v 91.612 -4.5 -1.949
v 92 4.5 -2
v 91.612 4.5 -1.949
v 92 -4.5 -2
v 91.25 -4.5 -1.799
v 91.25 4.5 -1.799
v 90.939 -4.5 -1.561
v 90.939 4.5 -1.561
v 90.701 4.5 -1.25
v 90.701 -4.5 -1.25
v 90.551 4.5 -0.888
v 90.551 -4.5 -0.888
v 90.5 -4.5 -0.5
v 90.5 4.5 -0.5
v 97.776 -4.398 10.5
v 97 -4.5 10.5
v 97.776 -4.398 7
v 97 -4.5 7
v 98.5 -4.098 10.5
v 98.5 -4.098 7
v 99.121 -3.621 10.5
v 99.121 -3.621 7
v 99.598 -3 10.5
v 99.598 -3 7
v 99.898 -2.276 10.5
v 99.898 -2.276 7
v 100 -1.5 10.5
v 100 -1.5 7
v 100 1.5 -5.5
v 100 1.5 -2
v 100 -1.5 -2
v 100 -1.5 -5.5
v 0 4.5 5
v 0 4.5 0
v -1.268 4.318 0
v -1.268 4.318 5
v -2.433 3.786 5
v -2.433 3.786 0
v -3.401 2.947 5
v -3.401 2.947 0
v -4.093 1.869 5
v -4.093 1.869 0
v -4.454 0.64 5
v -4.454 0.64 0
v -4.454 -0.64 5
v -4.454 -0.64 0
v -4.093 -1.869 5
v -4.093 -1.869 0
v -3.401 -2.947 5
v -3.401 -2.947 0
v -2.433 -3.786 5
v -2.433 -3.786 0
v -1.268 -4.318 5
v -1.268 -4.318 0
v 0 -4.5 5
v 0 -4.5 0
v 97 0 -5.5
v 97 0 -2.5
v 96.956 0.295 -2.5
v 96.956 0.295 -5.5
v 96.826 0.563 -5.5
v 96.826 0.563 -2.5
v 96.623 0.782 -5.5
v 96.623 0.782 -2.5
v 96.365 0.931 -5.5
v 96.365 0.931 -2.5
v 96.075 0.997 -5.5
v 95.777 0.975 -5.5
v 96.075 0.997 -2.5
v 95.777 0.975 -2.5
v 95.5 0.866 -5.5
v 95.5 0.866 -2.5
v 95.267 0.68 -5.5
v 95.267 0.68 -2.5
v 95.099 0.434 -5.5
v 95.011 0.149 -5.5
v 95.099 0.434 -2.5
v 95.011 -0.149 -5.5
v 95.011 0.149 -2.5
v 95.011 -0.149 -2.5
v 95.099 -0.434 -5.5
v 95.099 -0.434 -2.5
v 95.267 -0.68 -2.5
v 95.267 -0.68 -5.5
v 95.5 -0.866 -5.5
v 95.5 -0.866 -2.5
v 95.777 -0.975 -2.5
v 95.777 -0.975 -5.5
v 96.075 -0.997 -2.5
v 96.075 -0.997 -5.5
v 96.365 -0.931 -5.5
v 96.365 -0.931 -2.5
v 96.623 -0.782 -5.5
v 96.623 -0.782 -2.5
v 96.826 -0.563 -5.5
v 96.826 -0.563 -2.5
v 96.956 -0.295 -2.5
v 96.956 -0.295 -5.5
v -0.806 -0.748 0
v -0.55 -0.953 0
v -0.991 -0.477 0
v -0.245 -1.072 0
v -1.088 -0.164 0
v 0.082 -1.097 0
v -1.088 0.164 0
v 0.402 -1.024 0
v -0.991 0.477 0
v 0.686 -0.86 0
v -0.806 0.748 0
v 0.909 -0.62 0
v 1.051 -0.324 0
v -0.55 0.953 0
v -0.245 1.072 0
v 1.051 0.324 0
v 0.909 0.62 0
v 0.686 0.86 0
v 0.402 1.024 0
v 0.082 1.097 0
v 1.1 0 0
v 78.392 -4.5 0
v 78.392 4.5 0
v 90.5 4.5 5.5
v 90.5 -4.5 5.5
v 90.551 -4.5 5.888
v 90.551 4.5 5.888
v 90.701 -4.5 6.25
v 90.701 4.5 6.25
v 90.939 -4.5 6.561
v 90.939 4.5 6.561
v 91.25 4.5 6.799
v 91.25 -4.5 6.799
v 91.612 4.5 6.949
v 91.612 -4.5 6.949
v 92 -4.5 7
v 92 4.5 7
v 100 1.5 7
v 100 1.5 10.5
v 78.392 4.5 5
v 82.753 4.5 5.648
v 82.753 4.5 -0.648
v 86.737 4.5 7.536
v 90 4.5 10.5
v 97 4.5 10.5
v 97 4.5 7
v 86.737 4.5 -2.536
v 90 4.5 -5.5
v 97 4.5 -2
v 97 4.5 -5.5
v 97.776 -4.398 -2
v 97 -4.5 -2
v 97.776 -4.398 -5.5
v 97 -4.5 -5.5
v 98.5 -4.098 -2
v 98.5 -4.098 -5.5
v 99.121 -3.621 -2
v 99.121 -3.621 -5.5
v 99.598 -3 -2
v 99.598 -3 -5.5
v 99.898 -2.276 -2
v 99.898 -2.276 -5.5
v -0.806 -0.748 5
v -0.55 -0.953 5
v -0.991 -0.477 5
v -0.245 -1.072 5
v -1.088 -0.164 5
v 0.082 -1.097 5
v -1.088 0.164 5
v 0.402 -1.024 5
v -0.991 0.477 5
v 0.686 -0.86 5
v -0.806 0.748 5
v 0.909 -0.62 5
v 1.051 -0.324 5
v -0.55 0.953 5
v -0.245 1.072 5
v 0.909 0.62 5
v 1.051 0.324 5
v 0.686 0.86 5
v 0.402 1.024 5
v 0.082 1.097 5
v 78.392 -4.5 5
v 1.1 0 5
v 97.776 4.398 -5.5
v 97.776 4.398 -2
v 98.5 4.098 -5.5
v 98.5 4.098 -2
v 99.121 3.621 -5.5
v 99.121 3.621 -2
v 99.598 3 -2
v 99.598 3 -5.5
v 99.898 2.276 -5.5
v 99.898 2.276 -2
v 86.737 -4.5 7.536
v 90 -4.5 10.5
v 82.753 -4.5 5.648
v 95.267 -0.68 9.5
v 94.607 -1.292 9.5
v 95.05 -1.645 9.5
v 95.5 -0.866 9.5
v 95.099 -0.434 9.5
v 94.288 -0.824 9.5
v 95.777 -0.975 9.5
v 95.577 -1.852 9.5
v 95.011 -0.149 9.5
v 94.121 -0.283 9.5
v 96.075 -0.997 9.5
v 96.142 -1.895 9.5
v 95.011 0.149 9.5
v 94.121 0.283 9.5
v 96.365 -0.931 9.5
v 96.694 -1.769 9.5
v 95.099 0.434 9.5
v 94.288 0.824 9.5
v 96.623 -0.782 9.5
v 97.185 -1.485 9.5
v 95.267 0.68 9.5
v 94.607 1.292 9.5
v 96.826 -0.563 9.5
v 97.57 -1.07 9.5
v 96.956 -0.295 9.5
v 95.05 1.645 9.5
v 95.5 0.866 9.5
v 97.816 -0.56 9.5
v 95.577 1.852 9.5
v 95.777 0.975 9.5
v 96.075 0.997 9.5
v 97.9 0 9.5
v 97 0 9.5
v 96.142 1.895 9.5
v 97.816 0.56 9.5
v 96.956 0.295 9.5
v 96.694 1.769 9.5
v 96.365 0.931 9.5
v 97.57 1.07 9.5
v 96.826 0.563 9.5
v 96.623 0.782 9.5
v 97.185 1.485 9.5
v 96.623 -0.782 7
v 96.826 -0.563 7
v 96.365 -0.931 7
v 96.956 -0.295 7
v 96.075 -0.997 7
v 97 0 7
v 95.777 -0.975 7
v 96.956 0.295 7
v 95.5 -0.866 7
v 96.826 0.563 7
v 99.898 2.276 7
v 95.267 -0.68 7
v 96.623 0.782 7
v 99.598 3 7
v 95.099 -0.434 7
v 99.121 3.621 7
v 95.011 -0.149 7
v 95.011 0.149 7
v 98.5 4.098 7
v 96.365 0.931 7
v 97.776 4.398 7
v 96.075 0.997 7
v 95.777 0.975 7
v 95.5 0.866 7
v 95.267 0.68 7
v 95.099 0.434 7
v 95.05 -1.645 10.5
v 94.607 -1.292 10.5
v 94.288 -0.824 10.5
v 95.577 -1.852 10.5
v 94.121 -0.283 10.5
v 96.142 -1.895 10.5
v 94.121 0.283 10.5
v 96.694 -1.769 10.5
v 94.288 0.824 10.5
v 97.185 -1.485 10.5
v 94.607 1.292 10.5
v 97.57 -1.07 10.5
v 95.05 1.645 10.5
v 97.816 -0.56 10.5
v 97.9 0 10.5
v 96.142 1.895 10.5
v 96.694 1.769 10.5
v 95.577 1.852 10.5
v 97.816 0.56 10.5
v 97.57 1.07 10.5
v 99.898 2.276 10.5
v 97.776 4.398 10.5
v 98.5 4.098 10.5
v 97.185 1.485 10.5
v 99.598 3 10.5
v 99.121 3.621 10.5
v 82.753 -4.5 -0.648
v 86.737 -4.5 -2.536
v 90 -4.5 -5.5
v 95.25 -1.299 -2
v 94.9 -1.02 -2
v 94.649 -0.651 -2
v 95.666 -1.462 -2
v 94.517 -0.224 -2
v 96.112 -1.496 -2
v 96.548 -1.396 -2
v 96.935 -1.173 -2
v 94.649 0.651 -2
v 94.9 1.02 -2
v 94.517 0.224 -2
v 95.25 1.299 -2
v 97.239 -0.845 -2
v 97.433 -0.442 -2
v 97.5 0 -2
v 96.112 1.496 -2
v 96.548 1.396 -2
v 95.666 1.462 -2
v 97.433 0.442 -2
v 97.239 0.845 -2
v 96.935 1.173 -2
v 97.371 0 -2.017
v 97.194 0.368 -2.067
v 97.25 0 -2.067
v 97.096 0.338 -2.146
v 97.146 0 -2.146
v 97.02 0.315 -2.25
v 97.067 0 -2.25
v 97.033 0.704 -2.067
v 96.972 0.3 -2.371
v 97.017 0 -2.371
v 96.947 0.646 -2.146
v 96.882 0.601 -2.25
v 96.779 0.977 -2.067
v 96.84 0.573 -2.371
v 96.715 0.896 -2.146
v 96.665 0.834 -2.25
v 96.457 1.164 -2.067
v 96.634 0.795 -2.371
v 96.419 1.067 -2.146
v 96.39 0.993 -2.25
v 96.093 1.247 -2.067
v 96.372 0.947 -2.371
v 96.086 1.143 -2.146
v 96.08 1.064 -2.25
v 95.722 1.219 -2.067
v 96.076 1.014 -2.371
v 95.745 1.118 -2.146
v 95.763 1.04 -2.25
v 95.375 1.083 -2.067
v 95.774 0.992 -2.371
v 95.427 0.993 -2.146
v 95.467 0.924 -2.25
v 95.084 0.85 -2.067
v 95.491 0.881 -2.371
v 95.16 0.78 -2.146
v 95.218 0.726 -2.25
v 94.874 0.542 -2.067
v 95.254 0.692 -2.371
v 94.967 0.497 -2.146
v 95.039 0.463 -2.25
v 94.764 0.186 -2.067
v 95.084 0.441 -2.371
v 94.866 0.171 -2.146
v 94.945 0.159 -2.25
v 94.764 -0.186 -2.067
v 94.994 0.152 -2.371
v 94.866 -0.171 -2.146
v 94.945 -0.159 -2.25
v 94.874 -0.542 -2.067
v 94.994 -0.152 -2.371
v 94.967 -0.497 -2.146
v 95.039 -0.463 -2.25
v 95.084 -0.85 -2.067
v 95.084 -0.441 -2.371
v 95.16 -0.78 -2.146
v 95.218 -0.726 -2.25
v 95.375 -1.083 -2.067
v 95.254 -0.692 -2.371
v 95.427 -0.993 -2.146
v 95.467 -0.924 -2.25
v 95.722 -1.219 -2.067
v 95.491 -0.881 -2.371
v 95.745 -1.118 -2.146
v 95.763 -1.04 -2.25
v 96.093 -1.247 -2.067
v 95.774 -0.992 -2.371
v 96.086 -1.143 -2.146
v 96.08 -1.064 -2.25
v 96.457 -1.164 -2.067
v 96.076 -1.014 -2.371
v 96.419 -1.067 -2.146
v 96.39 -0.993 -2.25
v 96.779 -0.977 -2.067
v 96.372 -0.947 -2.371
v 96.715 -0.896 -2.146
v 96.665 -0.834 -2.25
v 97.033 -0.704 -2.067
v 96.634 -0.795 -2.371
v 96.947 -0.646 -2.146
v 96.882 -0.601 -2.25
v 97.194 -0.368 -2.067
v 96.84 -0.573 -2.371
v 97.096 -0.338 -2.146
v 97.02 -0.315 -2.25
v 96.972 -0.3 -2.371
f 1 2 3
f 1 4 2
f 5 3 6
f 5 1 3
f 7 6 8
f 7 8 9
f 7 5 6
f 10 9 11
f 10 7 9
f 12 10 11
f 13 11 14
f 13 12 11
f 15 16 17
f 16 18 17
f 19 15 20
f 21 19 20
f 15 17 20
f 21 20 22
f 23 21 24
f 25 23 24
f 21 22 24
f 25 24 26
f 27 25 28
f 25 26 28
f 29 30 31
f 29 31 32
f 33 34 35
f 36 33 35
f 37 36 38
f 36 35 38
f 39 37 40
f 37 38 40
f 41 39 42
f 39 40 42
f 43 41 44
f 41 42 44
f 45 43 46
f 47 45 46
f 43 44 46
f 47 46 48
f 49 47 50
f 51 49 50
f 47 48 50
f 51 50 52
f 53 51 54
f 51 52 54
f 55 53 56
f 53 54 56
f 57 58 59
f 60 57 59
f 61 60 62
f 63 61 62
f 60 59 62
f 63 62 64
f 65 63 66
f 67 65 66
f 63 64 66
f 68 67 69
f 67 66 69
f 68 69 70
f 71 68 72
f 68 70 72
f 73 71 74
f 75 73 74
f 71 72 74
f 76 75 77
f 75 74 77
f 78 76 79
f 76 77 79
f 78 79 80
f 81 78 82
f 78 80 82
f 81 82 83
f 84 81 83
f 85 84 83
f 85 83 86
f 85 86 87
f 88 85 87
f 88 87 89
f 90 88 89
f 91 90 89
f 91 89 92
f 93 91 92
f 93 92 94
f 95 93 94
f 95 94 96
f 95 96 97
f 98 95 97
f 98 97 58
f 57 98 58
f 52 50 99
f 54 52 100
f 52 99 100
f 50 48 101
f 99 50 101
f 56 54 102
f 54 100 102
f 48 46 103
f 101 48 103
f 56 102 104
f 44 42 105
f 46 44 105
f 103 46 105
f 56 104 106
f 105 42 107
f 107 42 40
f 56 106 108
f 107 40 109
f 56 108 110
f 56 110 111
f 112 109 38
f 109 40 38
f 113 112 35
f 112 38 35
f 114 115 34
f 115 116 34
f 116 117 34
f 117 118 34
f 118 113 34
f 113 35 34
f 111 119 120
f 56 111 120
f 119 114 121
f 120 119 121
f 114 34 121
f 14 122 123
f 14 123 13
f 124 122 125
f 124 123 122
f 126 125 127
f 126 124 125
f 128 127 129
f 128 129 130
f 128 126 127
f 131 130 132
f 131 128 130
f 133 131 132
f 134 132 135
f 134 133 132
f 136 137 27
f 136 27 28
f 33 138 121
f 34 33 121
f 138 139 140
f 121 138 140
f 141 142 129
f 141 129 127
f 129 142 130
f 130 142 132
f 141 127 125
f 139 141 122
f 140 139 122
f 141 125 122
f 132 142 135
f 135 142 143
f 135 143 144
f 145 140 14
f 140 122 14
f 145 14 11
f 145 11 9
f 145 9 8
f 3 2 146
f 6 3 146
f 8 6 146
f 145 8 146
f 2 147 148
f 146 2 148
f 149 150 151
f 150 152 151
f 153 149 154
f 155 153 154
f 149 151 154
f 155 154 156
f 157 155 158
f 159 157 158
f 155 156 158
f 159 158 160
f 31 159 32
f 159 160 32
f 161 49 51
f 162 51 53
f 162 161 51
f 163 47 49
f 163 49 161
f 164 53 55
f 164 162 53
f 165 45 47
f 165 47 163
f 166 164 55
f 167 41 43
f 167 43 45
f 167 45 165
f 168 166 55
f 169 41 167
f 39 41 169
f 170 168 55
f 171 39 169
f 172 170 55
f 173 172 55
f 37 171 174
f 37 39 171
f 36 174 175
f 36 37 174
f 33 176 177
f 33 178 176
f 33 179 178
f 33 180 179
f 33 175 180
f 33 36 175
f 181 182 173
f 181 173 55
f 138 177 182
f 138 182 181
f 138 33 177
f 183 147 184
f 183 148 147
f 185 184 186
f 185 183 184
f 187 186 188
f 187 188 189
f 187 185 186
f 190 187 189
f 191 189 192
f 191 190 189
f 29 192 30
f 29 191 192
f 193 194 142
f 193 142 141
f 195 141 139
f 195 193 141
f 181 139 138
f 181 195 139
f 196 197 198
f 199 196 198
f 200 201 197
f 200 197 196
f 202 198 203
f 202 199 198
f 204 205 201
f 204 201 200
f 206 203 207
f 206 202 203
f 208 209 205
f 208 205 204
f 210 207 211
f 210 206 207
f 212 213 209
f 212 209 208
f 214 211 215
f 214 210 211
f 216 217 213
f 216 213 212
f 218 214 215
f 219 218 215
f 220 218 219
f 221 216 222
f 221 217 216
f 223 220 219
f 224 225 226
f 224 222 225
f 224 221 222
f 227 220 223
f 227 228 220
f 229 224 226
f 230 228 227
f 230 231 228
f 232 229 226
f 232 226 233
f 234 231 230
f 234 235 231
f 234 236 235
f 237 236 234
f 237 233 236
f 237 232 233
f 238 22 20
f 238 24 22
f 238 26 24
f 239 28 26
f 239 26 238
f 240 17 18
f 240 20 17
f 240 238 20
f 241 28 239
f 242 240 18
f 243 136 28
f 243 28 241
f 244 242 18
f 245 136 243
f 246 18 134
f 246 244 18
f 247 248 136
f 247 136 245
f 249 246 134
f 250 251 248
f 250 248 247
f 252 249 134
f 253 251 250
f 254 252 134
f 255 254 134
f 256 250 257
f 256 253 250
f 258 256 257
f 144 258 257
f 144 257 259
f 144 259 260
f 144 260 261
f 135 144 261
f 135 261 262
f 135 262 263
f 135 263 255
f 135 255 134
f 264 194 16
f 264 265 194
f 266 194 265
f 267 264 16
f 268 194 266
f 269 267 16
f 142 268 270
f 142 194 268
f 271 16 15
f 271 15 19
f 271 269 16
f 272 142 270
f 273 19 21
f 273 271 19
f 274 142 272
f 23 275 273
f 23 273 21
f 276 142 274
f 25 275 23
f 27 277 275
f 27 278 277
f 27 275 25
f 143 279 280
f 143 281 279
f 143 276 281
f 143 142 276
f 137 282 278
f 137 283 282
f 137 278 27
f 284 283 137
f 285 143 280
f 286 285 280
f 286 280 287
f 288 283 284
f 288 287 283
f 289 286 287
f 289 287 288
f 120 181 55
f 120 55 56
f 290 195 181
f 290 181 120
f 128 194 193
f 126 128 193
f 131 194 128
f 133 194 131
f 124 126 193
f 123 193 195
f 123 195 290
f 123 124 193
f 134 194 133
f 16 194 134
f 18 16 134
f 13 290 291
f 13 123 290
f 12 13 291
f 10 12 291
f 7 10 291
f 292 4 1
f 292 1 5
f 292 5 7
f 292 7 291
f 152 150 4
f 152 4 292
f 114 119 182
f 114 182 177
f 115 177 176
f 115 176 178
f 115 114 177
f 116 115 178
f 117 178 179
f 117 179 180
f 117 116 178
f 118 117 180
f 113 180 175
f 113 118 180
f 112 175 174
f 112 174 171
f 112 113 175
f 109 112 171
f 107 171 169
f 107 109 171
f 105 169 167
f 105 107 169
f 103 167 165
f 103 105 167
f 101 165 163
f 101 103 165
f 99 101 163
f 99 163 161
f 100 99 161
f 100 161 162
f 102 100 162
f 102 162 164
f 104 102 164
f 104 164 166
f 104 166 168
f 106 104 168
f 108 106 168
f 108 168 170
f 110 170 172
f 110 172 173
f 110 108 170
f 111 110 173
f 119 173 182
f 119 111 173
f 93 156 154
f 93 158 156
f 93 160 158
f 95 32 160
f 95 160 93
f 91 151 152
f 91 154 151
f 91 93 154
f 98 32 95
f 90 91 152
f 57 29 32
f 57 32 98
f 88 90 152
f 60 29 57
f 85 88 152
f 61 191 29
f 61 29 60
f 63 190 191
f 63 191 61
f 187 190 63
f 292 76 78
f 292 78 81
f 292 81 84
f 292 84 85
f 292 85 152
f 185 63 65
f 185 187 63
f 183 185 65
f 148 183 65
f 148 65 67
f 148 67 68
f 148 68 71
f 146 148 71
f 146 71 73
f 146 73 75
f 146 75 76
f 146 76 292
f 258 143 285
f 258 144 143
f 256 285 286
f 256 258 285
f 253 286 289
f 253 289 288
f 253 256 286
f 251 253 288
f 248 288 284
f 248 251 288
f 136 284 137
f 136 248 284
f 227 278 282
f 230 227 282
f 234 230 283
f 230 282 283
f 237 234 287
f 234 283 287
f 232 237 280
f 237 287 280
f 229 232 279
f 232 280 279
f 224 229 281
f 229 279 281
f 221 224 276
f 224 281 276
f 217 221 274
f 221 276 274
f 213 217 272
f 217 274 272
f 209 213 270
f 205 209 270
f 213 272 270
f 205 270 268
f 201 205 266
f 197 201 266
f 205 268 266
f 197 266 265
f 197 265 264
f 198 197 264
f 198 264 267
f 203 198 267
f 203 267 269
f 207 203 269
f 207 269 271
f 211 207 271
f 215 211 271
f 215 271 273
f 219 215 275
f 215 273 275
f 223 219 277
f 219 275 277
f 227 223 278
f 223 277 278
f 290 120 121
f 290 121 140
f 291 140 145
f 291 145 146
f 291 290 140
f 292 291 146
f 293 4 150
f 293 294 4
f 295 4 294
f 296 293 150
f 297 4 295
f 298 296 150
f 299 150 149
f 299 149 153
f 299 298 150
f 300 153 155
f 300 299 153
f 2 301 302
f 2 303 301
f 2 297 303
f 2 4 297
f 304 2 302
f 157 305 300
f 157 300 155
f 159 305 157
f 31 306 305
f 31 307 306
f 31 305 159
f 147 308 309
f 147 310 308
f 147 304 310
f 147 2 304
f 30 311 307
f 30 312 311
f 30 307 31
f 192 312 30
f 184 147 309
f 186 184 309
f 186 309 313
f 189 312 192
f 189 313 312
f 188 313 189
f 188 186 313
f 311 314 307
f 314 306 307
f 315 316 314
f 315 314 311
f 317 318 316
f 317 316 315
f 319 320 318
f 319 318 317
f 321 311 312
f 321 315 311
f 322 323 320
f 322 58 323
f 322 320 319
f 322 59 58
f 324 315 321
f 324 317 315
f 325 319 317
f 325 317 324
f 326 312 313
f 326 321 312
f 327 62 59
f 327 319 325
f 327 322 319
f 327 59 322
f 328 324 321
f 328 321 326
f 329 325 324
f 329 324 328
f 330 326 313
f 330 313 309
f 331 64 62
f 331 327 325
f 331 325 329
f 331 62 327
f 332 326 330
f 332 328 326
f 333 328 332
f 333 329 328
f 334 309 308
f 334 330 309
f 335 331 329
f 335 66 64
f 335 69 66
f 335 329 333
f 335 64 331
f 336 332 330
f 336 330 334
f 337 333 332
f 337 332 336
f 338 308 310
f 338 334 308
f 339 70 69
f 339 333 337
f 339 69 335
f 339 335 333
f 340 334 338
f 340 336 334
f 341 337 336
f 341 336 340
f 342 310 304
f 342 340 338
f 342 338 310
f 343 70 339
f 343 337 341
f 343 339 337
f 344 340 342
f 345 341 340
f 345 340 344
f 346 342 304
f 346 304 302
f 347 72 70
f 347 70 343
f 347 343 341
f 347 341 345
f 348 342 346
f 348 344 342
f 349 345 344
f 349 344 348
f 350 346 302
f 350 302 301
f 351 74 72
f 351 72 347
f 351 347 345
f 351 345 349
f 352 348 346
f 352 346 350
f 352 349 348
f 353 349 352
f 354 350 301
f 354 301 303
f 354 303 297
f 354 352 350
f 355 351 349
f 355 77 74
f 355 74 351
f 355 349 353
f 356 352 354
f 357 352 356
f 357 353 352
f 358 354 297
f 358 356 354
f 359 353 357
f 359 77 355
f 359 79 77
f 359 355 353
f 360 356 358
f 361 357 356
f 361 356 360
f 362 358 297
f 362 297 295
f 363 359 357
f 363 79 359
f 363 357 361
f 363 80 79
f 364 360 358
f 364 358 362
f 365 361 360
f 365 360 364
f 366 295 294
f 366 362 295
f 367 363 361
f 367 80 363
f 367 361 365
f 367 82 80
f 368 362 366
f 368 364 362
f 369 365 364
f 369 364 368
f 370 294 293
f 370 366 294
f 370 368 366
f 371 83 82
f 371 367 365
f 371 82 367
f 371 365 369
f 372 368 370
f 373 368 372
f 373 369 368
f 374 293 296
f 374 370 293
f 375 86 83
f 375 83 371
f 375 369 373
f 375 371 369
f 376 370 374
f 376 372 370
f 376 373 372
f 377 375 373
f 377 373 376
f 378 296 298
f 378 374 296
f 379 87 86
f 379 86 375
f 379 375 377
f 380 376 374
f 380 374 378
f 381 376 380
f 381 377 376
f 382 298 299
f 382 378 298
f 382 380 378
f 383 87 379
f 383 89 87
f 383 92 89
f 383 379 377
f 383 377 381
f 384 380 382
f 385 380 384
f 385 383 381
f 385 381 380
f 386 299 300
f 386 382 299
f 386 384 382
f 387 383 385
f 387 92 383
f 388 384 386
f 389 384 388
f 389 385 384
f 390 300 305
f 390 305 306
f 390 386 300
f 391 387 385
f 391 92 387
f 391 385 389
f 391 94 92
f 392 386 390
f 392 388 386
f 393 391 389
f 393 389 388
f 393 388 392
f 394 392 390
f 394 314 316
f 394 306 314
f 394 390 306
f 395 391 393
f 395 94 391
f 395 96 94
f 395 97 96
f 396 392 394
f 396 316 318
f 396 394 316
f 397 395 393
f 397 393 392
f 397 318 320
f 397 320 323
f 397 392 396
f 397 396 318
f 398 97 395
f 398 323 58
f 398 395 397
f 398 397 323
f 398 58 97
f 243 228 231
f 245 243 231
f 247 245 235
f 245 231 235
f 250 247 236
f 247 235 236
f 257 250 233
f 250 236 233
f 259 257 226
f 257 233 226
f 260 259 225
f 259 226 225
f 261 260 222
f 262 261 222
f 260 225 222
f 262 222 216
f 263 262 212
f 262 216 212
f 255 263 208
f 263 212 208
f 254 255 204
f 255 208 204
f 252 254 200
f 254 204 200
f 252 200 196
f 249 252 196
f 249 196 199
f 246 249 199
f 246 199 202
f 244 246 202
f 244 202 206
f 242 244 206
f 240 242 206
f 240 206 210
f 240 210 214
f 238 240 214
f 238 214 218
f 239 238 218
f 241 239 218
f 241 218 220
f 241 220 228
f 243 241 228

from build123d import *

# Parameters (mm, degrees)
SKETCH1_R           = 1.1
BOSS_EXTRUDE1_DEPTH = 5
BOSS_EXTRUDE2_DEPTH = 9
FILLET1_R           = 15
SKETCH3_R           = 1
CUT_EXTRUDE1_DEPTH  = 16
FILLET2_R           = 3
SKETCH4_R           = 1.9
CUT_EXTRUDE2_DEPTH  = 1
FILLET3_R           = 1.5
FILLET4_R           = 0.5


with BuildPart() as part:
    # Sketch1 → Boss-Extrude1 (new body)
    with BuildSketch(Plane.XY):
        with BuildLine():
            ThreePointArc((0, 4.5), (-4.5, 0), (0, -4.5))
            Line((0, -4.5), (90, -4.5))
            Line((90, -4.5), (90, 4.5))
            Line((90, 4.5), (0, 4.5))
        make_face()
        Circle(SKETCH1_R, mode=Mode.SUBTRACT)
    extrude(amount=BOSS_EXTRUDE1_DEPTH)

    # Sketch2 → Boss-Extrude2 (add)
    with BuildSketch(Plane(origin=(0, 4.5, 0), x_dir=(1, 0, 0), z_dir=(0, 1, 0))):
        Polygon((90.5, 2), (100, 2), (100, 5.5), (90, 5.5), (90, 0), (90, -5), (90, -10.5), (100, -10.5), (100, -7), (90.5, -7), align=None)
    extrude(amount=-BOSS_EXTRUDE2_DEPTH)

    # Fillet1
    # the kernel refuses this fillet: 15 mm, written as the material it adds along each edge
    with BuildSketch(Plane(origin=(90, -4.5, 0), x_dir=(0, 0, -1), z_dir=(0, 1, 0))) as fillet1_piece_1:
        with BuildLine():
            CenterArc((15, 11.608186766), FILLET1_R, 180, 50.703519761)
            Line((0, 11.608186766), (-0.3, 11.608186766))
            Line((-0.3, 11.608186766), (-0.3, 0))
            Line((-0.3, 0), (0, -0.3))
            ThreePointArc((0, -0.3), (2.75, -0.3), (5.31, -0.232163735))
            Line((5.31, -0.232163735), (5.5, 0))
        make_face()
    extrude(amount=9)
    with BuildSketch(Plane(origin=(90, -4.5, 5), x_dir=(0, 0, 1), z_dir=(0, 1, 0))) as fillet1_piece_2:
        with BuildLine():
            CenterArc((15, -11.608186766), FILLET1_R, 129.296480239, 50.703519761)
            Line((0, -11.608186766), (-0.3, -11.608186766))
            Line((-0.3, -11.608186766), (-0.3, 0))
            Line((-0.3, 0), (0, 0.3))
            ThreePointArc((0, 0.3), (2.75, 0.3), (5.31, 0.232163735))
            Line((5.31, 0.232163735), (5.5, 0))
        make_face()
    extrude(amount=9)

    # Sketch3 → Cut-Extrude1 (cut)
    with BuildSketch(Plane.XY.offset(10.5)):
        with Locations((96, 0)):
            Circle(SKETCH3_R)
    extrude(amount=-CUT_EXTRUDE1_DEPTH, mode=Mode.SUBTRACT)

    # Fillet2
    fillet2_edges = [part.edges().sort_by_distance(p)[0] for p in [
        (100, 4.5, 8.75),
        (100, 4.5, -3.75),
        (100, -4.5, 8.75),
        (100, -4.5, -3.75),
    ]]
    fillet(fillet2_edges, radius=FILLET2_R)

    # Sketch4 → Cut-Extrude2 (cut)
    with BuildSketch(Plane.XY.offset(10.5)):
        with Locations((96, 0)):
            Circle(SKETCH4_R)
    extrude(amount=-CUT_EXTRUDE2_DEPTH, mode=Mode.SUBTRACT)

    # Fillet3
    fillet3_edges = [part.edges().sort_by_distance(p)[0] for p in [
        (90.5, 0, 7),
        (90.5, 0, -2),
    ]]
    fillet(fillet3_edges, radius=FILLET3_R)

    # Fillet4
    fillet4_edges = [part.edges().sort_by_distance(p)[0] for p in [
        (95, 0, -2),
    ]]
    fillet(fillet4_edges, radius=FILLET4_R)


solid = part.part
